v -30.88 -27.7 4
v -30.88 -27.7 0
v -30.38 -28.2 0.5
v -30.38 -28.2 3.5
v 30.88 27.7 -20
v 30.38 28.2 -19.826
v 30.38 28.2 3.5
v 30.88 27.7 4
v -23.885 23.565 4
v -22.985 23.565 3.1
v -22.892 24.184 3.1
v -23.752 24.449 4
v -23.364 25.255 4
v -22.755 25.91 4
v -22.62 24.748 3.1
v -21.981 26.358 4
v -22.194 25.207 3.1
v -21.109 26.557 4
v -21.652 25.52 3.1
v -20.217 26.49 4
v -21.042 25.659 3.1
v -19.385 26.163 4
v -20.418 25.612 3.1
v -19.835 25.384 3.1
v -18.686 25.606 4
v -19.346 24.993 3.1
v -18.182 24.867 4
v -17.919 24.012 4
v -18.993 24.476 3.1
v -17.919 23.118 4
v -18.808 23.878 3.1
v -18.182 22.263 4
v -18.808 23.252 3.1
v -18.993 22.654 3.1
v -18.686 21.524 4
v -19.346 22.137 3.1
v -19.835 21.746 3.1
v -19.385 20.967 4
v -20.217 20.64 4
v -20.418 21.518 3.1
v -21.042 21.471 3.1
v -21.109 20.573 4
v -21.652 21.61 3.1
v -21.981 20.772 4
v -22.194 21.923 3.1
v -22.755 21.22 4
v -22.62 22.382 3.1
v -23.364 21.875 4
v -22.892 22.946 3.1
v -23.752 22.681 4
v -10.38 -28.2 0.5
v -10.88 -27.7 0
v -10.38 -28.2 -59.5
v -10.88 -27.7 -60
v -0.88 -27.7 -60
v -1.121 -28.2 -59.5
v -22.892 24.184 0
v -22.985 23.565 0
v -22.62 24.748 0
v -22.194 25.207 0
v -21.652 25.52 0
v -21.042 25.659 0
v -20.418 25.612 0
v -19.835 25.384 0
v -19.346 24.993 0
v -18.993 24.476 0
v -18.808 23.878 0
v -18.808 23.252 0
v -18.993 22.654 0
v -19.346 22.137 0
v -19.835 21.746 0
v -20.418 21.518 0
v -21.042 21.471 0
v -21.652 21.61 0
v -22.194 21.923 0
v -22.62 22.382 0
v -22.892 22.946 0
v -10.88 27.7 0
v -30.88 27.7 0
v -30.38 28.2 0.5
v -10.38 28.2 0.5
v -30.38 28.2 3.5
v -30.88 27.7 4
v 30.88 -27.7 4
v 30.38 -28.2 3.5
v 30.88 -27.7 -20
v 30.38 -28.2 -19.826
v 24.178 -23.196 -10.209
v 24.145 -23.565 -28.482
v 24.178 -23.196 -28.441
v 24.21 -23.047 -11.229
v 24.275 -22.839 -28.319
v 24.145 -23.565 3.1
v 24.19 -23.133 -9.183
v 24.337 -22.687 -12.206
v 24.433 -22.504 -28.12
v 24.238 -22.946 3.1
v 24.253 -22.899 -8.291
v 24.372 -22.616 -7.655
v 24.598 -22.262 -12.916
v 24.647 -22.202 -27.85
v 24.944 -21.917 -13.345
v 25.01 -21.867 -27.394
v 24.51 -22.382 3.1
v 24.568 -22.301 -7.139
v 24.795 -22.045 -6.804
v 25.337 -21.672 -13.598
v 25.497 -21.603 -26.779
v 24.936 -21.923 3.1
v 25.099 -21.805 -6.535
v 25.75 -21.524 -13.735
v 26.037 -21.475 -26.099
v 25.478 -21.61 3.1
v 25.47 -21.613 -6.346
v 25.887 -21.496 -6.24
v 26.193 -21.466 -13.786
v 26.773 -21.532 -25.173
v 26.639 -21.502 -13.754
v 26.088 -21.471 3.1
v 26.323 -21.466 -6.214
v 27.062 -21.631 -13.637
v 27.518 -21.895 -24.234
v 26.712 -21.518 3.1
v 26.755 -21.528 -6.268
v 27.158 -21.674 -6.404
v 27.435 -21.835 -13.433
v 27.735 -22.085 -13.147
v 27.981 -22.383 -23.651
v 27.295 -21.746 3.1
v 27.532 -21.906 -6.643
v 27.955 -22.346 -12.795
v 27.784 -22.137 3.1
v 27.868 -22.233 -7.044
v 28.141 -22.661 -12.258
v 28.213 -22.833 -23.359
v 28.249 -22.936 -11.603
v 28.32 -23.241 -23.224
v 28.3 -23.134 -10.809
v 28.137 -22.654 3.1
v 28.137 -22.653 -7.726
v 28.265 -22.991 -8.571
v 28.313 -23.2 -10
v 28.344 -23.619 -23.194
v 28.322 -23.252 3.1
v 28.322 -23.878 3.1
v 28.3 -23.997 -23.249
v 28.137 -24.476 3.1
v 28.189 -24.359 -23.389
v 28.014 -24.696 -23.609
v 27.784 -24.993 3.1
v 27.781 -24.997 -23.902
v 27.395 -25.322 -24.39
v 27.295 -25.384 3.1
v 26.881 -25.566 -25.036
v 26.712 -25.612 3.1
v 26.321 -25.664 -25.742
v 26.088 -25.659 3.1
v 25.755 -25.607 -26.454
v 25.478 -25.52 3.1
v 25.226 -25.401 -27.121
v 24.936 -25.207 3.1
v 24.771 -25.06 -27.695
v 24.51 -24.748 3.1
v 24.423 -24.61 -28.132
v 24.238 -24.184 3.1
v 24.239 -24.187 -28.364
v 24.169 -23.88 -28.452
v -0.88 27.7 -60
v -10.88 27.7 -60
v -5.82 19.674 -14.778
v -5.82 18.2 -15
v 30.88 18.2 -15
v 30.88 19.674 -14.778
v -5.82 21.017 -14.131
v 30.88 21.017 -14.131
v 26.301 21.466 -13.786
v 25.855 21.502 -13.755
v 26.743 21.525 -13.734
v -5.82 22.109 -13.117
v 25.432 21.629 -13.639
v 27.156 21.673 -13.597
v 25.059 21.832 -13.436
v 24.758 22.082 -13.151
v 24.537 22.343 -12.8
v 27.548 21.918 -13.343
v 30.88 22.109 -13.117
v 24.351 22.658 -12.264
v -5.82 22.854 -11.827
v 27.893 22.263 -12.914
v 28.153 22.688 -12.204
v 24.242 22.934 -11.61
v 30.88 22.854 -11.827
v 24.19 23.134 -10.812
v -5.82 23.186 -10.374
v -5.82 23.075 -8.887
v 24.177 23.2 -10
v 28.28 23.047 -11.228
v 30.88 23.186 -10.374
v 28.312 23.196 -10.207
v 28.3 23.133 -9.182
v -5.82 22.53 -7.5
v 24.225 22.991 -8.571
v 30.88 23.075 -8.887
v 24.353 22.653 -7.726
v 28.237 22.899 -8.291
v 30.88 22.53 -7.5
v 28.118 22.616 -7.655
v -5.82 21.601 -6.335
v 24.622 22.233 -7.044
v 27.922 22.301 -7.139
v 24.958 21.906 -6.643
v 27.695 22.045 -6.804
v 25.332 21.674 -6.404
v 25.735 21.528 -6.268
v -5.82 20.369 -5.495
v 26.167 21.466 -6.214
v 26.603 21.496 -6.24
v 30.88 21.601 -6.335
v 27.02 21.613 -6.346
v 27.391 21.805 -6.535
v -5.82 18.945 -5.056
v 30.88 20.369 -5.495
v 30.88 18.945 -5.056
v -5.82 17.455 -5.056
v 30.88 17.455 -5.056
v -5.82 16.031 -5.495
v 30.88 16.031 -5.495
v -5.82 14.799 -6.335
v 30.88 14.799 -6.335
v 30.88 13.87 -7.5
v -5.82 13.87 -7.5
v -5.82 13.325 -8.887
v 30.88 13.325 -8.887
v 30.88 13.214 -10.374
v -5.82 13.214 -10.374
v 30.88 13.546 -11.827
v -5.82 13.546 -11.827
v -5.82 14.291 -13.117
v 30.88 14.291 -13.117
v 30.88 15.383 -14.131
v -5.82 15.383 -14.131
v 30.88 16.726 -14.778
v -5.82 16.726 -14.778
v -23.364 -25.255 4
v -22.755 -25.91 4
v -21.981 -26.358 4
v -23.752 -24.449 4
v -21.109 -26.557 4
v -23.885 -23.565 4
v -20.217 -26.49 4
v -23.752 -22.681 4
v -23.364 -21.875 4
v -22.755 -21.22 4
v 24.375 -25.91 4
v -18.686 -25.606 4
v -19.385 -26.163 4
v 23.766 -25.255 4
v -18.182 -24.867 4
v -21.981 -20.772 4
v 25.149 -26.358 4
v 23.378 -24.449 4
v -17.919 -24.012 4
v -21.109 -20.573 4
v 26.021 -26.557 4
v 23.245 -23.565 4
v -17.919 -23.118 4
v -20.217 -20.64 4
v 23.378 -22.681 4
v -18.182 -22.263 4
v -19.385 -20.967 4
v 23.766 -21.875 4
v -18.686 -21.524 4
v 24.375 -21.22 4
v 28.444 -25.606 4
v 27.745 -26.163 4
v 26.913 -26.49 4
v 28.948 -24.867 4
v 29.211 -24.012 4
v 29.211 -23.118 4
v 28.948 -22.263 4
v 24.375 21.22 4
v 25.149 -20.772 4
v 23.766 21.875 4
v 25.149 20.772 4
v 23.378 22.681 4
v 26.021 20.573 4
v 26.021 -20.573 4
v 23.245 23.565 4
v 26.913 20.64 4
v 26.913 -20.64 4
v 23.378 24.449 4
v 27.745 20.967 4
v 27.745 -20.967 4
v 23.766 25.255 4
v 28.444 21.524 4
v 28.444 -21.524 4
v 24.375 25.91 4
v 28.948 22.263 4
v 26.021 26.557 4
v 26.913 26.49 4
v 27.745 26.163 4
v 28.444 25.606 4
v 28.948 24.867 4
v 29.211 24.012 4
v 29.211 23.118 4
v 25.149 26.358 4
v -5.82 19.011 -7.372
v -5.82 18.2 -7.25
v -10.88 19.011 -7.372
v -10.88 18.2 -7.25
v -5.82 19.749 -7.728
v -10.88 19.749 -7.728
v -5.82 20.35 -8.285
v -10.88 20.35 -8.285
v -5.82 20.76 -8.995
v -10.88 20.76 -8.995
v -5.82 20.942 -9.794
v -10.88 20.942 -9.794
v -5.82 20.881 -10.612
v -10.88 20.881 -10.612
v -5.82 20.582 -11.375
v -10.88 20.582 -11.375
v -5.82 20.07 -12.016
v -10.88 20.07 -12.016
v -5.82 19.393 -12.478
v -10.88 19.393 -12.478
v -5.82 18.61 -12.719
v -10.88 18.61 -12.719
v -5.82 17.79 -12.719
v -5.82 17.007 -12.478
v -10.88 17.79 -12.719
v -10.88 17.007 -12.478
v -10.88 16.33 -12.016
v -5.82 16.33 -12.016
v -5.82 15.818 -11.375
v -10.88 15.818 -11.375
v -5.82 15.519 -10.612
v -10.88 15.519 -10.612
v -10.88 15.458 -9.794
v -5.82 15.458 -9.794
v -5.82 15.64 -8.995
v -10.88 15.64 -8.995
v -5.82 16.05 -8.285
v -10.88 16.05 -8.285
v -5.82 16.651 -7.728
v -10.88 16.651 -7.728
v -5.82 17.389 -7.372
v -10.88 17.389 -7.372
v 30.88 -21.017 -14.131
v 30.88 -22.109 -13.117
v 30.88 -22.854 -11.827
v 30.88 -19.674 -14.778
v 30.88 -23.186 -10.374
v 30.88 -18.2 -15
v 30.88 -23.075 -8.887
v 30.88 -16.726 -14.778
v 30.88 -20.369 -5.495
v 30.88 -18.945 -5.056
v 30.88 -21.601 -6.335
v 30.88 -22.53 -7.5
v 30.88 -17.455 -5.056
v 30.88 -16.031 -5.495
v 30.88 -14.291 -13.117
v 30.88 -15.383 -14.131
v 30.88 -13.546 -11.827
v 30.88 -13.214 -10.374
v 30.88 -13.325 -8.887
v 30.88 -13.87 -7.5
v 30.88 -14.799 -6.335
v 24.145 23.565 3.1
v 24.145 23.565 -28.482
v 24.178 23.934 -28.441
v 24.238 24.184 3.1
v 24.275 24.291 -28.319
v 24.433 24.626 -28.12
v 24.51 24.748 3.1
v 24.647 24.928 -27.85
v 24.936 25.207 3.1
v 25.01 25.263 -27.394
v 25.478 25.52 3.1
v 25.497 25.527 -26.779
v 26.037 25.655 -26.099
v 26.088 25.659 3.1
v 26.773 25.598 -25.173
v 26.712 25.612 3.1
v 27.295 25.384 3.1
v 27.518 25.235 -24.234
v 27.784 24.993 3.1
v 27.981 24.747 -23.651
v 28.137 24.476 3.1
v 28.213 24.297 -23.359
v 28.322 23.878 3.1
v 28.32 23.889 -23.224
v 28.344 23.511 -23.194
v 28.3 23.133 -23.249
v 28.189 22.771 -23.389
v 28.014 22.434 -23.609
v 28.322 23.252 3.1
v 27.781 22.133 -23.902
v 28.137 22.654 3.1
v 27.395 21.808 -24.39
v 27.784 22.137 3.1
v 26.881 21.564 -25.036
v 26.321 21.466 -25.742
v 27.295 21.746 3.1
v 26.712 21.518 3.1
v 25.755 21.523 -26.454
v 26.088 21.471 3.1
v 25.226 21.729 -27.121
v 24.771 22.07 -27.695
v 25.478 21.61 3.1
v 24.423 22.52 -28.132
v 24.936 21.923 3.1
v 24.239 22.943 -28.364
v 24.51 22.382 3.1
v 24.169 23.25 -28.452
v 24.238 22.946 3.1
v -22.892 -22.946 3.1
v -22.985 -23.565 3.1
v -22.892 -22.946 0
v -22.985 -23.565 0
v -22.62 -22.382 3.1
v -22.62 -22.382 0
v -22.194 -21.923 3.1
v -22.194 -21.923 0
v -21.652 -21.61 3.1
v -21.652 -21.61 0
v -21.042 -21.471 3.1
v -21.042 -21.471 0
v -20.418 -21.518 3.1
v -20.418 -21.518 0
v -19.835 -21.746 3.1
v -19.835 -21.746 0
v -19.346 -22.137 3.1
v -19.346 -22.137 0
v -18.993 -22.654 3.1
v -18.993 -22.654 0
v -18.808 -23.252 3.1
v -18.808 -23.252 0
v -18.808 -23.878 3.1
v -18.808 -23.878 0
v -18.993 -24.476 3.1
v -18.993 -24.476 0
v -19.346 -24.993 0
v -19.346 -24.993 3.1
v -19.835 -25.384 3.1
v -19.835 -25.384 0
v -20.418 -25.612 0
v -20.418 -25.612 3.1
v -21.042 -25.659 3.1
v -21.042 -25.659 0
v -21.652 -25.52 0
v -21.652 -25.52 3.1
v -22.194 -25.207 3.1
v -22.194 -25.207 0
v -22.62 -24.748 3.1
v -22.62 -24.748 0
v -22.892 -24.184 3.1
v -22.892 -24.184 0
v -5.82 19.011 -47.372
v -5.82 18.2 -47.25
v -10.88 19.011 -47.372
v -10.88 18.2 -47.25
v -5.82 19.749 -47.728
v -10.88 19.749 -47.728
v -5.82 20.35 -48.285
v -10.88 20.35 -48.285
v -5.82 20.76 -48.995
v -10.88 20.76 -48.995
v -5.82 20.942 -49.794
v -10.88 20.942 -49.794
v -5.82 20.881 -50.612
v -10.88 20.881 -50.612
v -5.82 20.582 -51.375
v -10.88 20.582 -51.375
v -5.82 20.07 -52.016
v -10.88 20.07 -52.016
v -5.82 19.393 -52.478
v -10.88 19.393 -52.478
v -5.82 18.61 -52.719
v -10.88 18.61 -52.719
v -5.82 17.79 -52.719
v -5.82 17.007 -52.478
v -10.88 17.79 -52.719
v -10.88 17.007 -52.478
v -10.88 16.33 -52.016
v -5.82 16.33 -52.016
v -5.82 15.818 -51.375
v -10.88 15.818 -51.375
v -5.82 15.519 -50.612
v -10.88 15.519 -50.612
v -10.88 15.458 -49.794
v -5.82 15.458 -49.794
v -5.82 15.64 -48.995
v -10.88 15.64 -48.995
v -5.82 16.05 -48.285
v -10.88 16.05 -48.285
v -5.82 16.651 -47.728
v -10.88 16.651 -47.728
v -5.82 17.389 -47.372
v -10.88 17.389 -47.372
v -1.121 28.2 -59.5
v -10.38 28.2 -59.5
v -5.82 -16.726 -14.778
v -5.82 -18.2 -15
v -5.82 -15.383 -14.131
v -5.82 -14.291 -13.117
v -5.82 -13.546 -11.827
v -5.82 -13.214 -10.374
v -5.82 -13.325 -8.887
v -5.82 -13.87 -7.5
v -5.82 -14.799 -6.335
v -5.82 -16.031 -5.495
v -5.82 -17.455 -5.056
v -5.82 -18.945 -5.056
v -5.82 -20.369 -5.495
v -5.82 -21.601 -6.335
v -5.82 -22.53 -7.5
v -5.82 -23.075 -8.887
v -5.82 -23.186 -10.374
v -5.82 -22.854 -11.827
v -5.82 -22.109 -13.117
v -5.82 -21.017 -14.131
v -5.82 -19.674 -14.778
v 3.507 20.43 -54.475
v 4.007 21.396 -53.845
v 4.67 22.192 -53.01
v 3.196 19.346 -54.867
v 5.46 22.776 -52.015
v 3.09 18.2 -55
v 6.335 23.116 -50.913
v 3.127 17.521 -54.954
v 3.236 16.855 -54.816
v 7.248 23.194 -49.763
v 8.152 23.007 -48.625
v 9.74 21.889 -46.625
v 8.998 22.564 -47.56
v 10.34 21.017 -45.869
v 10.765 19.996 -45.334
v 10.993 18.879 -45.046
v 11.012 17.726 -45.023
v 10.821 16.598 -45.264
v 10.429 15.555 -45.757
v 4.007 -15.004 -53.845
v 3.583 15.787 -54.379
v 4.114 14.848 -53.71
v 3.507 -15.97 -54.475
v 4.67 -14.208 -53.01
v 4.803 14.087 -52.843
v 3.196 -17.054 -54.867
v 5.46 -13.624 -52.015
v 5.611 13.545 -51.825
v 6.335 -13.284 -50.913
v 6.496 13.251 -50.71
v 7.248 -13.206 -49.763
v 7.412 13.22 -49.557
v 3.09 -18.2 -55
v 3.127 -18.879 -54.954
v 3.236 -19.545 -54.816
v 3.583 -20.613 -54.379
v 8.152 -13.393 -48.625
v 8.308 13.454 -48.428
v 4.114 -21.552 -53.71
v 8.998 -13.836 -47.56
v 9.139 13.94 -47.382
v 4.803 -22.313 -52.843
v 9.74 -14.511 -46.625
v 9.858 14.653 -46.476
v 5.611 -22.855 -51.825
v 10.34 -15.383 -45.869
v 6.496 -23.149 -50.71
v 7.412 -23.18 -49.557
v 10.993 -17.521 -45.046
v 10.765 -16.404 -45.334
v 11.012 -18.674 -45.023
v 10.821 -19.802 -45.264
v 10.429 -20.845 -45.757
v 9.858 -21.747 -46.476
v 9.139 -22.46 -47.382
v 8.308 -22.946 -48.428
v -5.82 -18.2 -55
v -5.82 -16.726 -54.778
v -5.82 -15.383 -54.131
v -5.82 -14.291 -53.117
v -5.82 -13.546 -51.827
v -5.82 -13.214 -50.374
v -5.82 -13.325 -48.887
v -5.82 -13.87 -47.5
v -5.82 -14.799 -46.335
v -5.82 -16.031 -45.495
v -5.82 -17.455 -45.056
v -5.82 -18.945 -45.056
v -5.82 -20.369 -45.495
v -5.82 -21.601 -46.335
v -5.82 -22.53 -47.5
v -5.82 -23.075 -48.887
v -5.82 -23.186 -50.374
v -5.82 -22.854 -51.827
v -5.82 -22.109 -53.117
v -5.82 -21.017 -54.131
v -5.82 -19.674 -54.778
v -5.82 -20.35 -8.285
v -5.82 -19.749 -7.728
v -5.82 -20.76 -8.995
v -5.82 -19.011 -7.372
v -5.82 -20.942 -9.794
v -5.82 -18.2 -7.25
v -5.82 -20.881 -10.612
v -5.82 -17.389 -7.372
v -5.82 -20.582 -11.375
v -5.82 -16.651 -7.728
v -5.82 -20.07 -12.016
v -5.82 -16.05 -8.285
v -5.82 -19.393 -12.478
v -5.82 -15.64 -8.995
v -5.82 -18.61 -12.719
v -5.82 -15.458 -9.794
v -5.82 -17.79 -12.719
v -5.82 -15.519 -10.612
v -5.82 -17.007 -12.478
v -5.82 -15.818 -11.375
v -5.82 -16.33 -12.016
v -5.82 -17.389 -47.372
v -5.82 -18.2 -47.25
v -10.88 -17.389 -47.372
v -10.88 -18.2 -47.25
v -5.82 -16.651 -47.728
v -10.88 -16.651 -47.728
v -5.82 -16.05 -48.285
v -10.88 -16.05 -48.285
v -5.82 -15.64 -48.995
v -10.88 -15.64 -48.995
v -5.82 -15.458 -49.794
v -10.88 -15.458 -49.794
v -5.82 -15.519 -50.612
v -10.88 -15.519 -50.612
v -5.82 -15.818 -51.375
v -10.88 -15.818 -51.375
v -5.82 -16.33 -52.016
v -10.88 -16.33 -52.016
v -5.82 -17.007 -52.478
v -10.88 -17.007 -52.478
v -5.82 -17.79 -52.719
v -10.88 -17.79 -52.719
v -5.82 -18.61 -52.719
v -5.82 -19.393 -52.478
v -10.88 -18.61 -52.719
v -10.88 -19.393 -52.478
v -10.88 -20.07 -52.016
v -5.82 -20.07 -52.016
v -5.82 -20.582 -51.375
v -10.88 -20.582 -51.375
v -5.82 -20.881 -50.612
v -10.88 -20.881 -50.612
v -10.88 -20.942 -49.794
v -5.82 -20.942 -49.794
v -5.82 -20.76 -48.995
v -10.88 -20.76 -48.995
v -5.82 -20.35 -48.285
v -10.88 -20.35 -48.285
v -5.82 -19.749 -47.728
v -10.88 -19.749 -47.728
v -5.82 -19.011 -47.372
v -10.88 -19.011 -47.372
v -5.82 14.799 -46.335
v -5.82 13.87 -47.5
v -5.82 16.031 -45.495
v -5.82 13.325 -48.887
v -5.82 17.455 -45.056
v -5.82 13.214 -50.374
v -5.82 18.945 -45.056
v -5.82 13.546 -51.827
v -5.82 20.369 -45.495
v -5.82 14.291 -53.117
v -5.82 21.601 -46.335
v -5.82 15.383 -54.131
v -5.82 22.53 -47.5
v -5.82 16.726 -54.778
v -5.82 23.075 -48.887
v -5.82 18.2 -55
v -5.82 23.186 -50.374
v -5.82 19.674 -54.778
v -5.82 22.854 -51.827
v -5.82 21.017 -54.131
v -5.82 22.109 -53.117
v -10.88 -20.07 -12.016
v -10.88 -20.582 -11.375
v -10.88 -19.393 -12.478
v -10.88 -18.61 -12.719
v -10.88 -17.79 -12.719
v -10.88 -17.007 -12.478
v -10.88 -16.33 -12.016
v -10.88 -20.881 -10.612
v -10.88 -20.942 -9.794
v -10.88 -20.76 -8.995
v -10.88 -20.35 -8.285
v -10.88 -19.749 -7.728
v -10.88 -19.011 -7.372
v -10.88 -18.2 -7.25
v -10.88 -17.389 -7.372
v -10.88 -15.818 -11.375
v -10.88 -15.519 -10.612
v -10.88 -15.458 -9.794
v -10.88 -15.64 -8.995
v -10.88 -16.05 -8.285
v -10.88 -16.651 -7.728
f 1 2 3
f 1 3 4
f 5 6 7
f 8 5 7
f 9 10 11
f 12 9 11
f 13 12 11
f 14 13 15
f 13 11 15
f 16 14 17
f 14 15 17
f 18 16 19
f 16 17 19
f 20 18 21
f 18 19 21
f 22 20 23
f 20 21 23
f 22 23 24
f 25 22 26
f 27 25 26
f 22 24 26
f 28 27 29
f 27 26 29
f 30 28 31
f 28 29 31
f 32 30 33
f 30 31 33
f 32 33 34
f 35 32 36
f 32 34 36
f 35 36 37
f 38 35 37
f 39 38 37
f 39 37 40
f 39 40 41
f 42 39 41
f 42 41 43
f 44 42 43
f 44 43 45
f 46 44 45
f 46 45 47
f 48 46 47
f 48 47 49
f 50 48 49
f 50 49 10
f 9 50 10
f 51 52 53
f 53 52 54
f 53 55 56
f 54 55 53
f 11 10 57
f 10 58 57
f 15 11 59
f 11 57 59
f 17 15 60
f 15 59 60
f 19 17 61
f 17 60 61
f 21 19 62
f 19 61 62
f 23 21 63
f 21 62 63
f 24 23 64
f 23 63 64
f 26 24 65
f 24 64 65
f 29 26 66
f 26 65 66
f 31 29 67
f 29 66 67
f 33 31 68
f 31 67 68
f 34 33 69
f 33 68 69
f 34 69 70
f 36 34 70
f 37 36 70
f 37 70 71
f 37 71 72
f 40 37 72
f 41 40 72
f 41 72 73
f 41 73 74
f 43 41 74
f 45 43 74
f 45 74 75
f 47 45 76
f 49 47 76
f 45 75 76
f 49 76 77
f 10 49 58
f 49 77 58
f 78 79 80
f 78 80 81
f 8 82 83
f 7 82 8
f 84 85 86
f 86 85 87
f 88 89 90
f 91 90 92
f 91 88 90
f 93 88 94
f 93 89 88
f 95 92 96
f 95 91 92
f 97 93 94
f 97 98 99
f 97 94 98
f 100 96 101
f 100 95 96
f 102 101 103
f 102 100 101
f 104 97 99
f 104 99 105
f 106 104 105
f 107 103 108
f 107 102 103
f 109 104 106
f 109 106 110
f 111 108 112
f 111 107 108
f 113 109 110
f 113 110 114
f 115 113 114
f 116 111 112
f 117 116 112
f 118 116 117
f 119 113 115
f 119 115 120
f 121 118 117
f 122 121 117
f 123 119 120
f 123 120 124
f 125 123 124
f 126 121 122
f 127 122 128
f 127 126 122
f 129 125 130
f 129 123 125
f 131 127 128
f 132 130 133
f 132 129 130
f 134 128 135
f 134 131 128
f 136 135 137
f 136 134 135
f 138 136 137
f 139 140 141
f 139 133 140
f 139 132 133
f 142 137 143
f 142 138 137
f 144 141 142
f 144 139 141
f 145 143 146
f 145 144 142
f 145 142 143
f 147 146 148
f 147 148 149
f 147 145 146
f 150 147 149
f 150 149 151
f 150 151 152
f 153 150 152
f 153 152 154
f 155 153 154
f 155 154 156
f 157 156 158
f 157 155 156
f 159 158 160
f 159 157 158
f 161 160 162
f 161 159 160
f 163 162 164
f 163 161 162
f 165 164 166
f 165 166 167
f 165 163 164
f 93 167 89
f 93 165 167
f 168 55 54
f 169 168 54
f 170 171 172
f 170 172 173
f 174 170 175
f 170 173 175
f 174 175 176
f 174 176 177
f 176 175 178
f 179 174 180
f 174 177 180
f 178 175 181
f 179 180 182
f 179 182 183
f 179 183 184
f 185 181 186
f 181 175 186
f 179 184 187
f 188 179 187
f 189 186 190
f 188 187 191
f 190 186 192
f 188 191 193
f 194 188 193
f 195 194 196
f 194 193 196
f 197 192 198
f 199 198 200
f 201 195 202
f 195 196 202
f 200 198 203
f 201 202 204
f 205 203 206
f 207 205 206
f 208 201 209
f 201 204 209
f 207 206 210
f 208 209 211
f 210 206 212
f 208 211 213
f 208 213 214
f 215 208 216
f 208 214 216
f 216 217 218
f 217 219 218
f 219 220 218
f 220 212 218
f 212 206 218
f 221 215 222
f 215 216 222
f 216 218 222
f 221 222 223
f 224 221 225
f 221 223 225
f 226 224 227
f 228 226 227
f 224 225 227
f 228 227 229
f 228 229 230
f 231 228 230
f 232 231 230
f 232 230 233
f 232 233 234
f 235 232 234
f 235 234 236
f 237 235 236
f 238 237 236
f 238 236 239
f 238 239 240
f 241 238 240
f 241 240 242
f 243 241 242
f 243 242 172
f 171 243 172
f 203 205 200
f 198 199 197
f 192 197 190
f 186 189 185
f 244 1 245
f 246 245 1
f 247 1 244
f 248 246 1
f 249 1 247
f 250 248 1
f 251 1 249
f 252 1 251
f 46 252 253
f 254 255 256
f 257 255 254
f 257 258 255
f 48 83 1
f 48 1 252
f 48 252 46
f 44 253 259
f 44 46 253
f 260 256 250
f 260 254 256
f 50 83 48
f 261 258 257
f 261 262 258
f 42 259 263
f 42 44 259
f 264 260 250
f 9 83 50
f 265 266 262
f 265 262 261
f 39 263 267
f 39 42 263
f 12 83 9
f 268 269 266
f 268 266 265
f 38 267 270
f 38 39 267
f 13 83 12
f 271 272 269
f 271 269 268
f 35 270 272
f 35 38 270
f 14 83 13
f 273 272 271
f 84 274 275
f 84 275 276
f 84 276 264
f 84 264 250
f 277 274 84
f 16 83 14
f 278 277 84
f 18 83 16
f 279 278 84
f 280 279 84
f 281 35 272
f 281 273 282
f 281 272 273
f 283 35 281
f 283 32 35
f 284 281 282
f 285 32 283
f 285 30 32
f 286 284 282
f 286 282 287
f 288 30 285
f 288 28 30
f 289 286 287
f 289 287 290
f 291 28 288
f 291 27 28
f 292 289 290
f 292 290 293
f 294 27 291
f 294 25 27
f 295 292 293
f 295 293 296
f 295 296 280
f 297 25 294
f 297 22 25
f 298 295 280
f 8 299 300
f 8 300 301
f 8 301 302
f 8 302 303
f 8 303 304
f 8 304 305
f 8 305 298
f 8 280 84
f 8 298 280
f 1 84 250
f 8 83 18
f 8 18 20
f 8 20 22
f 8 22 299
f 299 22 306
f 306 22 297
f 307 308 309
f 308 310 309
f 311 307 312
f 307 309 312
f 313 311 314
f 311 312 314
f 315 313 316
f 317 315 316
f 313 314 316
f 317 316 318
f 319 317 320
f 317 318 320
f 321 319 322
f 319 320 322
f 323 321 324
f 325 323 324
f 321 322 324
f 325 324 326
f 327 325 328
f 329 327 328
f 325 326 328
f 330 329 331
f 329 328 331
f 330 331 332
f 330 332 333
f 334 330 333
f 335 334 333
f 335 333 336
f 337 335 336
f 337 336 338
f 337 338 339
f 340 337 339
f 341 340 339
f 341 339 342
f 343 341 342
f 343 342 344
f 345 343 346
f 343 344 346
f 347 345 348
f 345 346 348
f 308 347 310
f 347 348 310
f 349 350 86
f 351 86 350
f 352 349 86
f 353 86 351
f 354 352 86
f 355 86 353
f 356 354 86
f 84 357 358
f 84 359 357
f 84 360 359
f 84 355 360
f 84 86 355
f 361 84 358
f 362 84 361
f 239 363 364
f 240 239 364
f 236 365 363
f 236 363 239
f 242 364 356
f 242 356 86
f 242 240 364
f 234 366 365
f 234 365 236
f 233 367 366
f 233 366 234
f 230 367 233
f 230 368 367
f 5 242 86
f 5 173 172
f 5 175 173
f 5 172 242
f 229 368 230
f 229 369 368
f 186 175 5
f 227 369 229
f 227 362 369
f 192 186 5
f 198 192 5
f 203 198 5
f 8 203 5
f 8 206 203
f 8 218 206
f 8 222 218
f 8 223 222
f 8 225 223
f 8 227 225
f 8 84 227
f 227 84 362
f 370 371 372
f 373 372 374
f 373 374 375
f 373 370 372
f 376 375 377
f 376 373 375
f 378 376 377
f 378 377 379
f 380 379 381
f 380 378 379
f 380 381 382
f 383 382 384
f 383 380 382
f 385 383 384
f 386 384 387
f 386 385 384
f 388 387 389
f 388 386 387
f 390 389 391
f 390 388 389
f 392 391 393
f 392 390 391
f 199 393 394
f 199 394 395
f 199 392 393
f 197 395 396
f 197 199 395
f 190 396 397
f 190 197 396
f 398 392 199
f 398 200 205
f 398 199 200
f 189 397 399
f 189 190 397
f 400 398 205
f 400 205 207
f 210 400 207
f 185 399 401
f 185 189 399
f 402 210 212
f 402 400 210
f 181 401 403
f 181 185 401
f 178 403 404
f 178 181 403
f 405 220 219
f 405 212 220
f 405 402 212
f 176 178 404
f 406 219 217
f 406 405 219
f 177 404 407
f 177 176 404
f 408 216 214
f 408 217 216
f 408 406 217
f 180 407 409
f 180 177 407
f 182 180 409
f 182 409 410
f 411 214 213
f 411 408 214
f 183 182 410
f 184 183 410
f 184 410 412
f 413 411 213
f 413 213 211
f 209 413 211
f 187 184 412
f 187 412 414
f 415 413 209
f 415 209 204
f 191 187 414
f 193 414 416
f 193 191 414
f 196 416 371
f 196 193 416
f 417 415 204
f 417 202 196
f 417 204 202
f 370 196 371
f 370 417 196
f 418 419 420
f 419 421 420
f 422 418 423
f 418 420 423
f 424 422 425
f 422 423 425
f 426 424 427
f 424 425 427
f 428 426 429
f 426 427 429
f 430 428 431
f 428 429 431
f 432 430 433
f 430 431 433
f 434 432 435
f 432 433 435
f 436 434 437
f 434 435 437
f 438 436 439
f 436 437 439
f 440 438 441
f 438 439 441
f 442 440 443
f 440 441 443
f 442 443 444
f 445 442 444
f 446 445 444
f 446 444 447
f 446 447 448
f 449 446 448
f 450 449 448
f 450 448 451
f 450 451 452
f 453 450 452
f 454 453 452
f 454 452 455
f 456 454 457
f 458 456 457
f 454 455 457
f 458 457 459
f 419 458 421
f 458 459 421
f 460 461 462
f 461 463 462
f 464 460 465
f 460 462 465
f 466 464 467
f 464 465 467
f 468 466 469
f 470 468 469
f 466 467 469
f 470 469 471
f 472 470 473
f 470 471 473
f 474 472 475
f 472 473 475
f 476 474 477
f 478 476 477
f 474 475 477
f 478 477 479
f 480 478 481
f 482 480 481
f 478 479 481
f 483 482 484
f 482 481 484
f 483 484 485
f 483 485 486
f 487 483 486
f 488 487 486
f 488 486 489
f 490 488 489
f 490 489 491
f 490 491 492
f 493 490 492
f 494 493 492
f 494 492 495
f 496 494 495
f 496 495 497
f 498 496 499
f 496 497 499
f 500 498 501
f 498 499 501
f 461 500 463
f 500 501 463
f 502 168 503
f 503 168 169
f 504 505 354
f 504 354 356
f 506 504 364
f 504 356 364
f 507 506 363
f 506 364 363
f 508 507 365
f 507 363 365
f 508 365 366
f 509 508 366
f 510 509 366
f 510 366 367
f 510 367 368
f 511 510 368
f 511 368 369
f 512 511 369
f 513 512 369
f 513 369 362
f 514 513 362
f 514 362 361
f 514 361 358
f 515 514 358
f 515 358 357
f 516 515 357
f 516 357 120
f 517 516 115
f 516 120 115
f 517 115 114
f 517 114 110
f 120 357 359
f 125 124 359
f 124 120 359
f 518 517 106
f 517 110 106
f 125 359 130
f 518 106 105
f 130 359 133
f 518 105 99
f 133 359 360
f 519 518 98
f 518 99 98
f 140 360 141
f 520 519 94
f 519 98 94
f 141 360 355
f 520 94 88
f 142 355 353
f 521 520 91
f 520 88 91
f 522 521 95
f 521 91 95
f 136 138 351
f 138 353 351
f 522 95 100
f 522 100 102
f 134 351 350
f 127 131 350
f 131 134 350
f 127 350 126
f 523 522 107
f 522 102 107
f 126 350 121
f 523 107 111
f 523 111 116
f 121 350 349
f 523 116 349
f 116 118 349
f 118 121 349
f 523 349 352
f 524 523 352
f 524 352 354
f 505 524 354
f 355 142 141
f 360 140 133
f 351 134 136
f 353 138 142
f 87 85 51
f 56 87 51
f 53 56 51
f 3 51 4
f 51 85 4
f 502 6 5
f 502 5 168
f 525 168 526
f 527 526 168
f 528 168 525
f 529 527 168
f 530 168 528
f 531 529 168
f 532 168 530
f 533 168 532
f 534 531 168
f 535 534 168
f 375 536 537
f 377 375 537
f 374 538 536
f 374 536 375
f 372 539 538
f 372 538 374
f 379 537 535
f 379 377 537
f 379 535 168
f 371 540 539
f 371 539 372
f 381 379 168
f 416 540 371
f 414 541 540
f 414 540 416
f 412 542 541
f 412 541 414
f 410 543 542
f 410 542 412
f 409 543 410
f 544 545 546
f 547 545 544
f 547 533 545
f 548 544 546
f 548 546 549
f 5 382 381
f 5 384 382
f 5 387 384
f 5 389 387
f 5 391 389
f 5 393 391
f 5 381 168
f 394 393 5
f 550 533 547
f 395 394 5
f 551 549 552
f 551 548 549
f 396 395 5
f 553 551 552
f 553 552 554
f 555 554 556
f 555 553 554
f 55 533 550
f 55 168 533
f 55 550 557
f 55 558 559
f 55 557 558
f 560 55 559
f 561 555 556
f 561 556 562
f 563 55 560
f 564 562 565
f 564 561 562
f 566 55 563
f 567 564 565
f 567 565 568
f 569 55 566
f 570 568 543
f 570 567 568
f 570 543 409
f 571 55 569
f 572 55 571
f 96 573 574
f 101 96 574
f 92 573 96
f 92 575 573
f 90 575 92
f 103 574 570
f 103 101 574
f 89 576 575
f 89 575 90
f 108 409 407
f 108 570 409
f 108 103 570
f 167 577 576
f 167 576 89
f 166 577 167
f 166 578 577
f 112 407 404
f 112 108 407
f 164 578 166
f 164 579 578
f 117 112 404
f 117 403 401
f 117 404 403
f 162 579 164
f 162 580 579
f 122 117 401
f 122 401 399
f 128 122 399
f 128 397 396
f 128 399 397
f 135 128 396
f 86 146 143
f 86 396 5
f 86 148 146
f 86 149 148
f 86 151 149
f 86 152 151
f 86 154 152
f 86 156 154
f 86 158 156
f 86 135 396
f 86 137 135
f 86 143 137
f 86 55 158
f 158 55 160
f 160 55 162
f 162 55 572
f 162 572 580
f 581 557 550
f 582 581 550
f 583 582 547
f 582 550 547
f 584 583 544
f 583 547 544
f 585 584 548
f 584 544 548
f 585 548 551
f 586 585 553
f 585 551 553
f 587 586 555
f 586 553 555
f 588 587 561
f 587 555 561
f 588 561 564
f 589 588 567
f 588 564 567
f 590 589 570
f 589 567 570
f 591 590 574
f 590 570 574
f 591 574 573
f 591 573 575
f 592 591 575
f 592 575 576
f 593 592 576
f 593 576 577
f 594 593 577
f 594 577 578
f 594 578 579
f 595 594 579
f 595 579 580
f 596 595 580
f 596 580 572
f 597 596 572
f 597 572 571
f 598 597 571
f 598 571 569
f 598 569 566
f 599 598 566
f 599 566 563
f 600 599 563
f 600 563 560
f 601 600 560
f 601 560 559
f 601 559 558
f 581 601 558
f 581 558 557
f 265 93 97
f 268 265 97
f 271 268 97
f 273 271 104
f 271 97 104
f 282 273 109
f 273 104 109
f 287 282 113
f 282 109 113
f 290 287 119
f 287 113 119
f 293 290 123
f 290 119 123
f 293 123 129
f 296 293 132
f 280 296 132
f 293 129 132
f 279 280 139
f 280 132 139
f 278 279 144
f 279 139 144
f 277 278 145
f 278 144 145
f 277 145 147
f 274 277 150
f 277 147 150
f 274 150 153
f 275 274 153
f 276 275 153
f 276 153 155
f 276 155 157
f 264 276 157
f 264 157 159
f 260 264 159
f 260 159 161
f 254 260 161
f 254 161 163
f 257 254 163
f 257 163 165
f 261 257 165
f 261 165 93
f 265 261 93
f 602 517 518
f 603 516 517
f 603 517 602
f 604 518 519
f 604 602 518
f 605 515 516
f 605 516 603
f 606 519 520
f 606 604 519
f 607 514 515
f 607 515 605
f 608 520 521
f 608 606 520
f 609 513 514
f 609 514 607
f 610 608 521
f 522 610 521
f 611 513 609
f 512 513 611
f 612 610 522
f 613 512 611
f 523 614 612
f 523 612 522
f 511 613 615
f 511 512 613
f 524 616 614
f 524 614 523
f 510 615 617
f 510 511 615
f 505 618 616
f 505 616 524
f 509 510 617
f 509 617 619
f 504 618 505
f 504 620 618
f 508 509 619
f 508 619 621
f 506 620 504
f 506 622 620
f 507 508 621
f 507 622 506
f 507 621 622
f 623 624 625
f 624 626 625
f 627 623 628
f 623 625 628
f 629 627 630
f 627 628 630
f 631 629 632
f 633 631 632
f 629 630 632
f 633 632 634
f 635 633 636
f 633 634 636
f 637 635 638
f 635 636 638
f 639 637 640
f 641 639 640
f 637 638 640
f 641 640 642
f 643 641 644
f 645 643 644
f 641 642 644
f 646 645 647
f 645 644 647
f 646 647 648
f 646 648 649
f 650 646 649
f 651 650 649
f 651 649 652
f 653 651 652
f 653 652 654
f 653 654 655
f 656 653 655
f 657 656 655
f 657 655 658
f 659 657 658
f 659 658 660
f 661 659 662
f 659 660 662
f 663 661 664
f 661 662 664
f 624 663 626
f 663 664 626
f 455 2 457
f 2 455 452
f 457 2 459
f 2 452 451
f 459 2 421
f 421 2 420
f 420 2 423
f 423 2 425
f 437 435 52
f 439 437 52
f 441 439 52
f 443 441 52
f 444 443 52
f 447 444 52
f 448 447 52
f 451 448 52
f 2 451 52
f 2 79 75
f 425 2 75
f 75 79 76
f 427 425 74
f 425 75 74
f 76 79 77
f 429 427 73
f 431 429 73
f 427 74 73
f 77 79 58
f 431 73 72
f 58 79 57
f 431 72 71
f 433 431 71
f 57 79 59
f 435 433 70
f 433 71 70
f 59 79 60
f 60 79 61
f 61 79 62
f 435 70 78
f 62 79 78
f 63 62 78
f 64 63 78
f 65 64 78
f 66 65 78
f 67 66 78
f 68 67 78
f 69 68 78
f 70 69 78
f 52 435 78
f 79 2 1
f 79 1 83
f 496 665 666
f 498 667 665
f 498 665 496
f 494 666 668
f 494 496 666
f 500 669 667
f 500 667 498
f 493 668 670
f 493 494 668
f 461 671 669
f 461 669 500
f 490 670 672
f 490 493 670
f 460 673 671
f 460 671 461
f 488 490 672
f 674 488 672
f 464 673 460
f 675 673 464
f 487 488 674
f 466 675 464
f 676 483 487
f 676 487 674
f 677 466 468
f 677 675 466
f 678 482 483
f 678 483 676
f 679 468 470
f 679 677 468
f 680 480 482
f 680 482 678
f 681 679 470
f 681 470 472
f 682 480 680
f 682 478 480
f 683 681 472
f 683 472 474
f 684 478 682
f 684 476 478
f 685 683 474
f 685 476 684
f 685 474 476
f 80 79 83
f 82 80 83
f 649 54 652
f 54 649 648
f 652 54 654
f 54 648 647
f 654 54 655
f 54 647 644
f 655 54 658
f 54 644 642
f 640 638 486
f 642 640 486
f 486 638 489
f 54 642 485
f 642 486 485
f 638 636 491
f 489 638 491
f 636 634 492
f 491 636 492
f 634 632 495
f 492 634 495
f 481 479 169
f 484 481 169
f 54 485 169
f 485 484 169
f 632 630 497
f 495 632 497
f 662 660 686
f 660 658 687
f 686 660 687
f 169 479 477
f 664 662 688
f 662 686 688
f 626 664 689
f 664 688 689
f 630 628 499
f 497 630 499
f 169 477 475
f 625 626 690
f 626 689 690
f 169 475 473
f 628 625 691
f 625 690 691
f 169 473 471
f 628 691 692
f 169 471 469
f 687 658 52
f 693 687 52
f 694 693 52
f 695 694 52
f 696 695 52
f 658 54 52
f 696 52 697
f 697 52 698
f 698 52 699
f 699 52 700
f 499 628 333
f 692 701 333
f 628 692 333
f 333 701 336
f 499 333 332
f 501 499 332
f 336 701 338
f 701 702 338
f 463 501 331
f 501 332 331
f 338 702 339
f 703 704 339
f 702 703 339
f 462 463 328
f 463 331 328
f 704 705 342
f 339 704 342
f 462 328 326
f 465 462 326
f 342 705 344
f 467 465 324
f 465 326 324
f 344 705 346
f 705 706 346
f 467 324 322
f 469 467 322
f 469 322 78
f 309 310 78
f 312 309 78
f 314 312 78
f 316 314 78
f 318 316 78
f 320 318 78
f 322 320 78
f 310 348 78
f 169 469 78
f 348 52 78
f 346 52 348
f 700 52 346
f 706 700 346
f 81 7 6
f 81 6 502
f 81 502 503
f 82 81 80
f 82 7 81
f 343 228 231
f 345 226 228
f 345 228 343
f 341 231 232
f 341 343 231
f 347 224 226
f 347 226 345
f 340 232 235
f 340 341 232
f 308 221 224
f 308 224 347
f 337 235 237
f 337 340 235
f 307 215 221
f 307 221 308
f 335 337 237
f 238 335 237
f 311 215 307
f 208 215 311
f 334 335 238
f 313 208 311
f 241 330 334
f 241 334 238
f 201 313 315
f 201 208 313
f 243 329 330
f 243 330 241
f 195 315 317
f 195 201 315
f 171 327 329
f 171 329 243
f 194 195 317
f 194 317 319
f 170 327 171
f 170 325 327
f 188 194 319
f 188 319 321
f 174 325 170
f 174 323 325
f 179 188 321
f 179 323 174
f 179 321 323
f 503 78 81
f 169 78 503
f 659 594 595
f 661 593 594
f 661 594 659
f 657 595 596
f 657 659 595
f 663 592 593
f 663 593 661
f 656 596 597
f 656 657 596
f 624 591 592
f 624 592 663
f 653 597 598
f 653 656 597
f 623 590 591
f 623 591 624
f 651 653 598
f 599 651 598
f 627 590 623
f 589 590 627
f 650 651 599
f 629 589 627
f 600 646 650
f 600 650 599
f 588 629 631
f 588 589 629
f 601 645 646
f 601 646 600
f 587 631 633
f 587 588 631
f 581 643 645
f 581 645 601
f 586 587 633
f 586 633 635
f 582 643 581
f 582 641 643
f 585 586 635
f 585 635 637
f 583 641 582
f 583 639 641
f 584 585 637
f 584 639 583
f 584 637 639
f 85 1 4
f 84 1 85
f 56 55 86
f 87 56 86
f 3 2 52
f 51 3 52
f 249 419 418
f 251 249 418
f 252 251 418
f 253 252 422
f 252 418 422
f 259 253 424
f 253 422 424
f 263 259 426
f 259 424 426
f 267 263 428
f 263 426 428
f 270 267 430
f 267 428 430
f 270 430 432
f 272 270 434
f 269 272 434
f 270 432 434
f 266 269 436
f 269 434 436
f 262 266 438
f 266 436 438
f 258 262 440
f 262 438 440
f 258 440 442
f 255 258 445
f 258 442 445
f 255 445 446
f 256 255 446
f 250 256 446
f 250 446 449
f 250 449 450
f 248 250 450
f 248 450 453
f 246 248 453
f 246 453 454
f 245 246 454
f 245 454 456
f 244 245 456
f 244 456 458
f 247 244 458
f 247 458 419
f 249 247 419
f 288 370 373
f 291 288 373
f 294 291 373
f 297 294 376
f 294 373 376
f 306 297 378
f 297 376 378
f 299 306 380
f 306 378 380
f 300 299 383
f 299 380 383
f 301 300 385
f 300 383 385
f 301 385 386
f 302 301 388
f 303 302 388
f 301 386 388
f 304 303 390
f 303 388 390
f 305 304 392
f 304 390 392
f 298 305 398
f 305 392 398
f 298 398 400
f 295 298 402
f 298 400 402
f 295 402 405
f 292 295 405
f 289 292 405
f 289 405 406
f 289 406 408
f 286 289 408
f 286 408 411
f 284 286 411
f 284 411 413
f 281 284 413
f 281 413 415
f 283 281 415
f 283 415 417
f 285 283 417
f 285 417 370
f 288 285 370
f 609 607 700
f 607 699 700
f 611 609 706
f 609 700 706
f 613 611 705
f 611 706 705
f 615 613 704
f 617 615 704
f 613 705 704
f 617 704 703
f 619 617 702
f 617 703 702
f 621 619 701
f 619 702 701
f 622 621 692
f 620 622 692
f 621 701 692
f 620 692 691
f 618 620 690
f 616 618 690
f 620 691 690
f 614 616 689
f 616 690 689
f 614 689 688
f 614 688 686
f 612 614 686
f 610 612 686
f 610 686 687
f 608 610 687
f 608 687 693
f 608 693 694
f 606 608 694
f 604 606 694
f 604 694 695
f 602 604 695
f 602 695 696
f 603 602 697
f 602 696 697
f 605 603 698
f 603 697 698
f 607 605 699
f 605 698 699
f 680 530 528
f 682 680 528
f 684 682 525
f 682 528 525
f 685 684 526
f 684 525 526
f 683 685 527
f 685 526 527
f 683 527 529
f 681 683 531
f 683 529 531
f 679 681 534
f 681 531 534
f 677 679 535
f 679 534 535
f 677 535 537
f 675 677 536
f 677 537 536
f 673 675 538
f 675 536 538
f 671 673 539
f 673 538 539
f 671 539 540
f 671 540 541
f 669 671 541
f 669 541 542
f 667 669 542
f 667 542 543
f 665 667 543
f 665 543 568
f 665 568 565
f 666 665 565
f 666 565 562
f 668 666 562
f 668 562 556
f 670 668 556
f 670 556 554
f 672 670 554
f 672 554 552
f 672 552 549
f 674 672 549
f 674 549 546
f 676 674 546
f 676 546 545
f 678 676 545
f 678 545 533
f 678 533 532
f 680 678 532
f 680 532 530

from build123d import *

# Parameters (mm, degrees)
SKETCH1_W                       = 61.76
SKETCH1_H                       = 56.4
BOSS_EXTRUDE1_DEPTH             = 4
M5X0_8_TAPPED_HOLE1_D           = 4.2
M5X0_8_TAPPED_HOLE1_CSINK_D     = 6
M5X0_8_TAPPED_HOLE1_CSINK_ANGLE = 90
SKETCH37_W                      = 41.76
SKETCH37_H                      = 56.4
SKETCH37_R                      = 2.1
BOSS_EXTRUDE7_DEPTH             = 60
CUT_EXTRUDE2_DEPTH              = 57.4
CBORE_FOR_M5_SHCS3_D            = 5.5
CBORE_FOR_M5_SHCS3_CBORE_D      = 10
CBORE_FOR_M5_SHCS3_CBORE_DEPTH  = 36.7
CHAMFER7_SIZE                   = 0.5


with BuildPart() as part:
    # Sketch1 → Boss-Extrude1 (new body)
    with BuildSketch(Plane.XY):
        Rectangle(SKETCH1_W, SKETCH1_H)
    extrude(amount=BOSS_EXTRUDE1_DEPTH)

    # M5x0.8 Tapped Hole1 (through all)
    with Locations(Plane.XY.offset(4)):
        with Locations((26.245, 23.565), (26.245, -23.565), (-20.885, -23.565), (-20.885, 23.565)):
            CounterSinkHole(M5X0_8_TAPPED_HOLE1_D / 2, M5X0_8_TAPPED_HOLE1_CSINK_D / 2, counter_sink_angle=M5X0_8_TAPPED_HOLE1_CSINK_ANGLE)

    # Sketch37 → Boss-Extrude7 (add)
    with BuildSketch(Plane(origin=(0, 0, 0), x_dir=(-1, 0, 0), z_dir=(0, 0, -1))):
        with Locations((-10, 0)):
            Rectangle(SKETCH37_W, SKETCH37_H)
        with Locations((-26.245, 23.565)):
            Circle(SKETCH37_R, mode=Mode.SUBTRACT)
        with Locations((-26.245, -23.565)):
            Circle(SKETCH37_R, mode=Mode.SUBTRACT)
    extrude(amount=BOSS_EXTRUDE7_DEPTH)

    # Sketch40 → Cut-Extrude2 (cut, through all)
    with BuildSketch(Plane.XZ.offset(28.2)):
        Polygon((-0.88, -60), (30.88, -20), (30.88, -60), align=None)
    extrude(amount=-CUT_EXTRUDE2_DEPTH, mode=Mode.SUBTRACT)

    # CBORE for M5 SHCS3 (through all)
    with Locations(Plane(origin=(30.88, 0, 0), x_dir=(0, 0, -1), z_dir=(1, 0, 0))):
        with Locations((10, -18.2), (10, 18.2), (50, 18.2), (50, -18.2)):
            CounterBoreHole(CBORE_FOR_M5_SHCS3_D / 2, CBORE_FOR_M5_SHCS3_CBORE_D / 2, CBORE_FOR_M5_SHCS3_CBORE_DEPTH)

    # Chamfer7
    chamfer7_edges = [part.edges().sort_by_distance(p)[0] for p in [
        (0, -28.2, 4),
        (-20.88, 28.2, 0),
        (-5.88, 28.2, -60),
        (-10.88, -28.2, -30),
        (-10.88, 28.2, -30),
        (-20.88, -28.2, 0),
        (-5.88, -28.2, -60),
        (15, 28.2, -40),
        (15, -28.2, -40),
        (30.88, -28.2, -8),
        (-30.88, -28.2, 2),
        (-30.88, 28.2, 2),
        (30.88, 28.2, -8),
        (0, 28.2, 4),
    ]]
    chamfer(chamfer7_edges, length=CHAMFER7_SIZE)


solid = part.part
